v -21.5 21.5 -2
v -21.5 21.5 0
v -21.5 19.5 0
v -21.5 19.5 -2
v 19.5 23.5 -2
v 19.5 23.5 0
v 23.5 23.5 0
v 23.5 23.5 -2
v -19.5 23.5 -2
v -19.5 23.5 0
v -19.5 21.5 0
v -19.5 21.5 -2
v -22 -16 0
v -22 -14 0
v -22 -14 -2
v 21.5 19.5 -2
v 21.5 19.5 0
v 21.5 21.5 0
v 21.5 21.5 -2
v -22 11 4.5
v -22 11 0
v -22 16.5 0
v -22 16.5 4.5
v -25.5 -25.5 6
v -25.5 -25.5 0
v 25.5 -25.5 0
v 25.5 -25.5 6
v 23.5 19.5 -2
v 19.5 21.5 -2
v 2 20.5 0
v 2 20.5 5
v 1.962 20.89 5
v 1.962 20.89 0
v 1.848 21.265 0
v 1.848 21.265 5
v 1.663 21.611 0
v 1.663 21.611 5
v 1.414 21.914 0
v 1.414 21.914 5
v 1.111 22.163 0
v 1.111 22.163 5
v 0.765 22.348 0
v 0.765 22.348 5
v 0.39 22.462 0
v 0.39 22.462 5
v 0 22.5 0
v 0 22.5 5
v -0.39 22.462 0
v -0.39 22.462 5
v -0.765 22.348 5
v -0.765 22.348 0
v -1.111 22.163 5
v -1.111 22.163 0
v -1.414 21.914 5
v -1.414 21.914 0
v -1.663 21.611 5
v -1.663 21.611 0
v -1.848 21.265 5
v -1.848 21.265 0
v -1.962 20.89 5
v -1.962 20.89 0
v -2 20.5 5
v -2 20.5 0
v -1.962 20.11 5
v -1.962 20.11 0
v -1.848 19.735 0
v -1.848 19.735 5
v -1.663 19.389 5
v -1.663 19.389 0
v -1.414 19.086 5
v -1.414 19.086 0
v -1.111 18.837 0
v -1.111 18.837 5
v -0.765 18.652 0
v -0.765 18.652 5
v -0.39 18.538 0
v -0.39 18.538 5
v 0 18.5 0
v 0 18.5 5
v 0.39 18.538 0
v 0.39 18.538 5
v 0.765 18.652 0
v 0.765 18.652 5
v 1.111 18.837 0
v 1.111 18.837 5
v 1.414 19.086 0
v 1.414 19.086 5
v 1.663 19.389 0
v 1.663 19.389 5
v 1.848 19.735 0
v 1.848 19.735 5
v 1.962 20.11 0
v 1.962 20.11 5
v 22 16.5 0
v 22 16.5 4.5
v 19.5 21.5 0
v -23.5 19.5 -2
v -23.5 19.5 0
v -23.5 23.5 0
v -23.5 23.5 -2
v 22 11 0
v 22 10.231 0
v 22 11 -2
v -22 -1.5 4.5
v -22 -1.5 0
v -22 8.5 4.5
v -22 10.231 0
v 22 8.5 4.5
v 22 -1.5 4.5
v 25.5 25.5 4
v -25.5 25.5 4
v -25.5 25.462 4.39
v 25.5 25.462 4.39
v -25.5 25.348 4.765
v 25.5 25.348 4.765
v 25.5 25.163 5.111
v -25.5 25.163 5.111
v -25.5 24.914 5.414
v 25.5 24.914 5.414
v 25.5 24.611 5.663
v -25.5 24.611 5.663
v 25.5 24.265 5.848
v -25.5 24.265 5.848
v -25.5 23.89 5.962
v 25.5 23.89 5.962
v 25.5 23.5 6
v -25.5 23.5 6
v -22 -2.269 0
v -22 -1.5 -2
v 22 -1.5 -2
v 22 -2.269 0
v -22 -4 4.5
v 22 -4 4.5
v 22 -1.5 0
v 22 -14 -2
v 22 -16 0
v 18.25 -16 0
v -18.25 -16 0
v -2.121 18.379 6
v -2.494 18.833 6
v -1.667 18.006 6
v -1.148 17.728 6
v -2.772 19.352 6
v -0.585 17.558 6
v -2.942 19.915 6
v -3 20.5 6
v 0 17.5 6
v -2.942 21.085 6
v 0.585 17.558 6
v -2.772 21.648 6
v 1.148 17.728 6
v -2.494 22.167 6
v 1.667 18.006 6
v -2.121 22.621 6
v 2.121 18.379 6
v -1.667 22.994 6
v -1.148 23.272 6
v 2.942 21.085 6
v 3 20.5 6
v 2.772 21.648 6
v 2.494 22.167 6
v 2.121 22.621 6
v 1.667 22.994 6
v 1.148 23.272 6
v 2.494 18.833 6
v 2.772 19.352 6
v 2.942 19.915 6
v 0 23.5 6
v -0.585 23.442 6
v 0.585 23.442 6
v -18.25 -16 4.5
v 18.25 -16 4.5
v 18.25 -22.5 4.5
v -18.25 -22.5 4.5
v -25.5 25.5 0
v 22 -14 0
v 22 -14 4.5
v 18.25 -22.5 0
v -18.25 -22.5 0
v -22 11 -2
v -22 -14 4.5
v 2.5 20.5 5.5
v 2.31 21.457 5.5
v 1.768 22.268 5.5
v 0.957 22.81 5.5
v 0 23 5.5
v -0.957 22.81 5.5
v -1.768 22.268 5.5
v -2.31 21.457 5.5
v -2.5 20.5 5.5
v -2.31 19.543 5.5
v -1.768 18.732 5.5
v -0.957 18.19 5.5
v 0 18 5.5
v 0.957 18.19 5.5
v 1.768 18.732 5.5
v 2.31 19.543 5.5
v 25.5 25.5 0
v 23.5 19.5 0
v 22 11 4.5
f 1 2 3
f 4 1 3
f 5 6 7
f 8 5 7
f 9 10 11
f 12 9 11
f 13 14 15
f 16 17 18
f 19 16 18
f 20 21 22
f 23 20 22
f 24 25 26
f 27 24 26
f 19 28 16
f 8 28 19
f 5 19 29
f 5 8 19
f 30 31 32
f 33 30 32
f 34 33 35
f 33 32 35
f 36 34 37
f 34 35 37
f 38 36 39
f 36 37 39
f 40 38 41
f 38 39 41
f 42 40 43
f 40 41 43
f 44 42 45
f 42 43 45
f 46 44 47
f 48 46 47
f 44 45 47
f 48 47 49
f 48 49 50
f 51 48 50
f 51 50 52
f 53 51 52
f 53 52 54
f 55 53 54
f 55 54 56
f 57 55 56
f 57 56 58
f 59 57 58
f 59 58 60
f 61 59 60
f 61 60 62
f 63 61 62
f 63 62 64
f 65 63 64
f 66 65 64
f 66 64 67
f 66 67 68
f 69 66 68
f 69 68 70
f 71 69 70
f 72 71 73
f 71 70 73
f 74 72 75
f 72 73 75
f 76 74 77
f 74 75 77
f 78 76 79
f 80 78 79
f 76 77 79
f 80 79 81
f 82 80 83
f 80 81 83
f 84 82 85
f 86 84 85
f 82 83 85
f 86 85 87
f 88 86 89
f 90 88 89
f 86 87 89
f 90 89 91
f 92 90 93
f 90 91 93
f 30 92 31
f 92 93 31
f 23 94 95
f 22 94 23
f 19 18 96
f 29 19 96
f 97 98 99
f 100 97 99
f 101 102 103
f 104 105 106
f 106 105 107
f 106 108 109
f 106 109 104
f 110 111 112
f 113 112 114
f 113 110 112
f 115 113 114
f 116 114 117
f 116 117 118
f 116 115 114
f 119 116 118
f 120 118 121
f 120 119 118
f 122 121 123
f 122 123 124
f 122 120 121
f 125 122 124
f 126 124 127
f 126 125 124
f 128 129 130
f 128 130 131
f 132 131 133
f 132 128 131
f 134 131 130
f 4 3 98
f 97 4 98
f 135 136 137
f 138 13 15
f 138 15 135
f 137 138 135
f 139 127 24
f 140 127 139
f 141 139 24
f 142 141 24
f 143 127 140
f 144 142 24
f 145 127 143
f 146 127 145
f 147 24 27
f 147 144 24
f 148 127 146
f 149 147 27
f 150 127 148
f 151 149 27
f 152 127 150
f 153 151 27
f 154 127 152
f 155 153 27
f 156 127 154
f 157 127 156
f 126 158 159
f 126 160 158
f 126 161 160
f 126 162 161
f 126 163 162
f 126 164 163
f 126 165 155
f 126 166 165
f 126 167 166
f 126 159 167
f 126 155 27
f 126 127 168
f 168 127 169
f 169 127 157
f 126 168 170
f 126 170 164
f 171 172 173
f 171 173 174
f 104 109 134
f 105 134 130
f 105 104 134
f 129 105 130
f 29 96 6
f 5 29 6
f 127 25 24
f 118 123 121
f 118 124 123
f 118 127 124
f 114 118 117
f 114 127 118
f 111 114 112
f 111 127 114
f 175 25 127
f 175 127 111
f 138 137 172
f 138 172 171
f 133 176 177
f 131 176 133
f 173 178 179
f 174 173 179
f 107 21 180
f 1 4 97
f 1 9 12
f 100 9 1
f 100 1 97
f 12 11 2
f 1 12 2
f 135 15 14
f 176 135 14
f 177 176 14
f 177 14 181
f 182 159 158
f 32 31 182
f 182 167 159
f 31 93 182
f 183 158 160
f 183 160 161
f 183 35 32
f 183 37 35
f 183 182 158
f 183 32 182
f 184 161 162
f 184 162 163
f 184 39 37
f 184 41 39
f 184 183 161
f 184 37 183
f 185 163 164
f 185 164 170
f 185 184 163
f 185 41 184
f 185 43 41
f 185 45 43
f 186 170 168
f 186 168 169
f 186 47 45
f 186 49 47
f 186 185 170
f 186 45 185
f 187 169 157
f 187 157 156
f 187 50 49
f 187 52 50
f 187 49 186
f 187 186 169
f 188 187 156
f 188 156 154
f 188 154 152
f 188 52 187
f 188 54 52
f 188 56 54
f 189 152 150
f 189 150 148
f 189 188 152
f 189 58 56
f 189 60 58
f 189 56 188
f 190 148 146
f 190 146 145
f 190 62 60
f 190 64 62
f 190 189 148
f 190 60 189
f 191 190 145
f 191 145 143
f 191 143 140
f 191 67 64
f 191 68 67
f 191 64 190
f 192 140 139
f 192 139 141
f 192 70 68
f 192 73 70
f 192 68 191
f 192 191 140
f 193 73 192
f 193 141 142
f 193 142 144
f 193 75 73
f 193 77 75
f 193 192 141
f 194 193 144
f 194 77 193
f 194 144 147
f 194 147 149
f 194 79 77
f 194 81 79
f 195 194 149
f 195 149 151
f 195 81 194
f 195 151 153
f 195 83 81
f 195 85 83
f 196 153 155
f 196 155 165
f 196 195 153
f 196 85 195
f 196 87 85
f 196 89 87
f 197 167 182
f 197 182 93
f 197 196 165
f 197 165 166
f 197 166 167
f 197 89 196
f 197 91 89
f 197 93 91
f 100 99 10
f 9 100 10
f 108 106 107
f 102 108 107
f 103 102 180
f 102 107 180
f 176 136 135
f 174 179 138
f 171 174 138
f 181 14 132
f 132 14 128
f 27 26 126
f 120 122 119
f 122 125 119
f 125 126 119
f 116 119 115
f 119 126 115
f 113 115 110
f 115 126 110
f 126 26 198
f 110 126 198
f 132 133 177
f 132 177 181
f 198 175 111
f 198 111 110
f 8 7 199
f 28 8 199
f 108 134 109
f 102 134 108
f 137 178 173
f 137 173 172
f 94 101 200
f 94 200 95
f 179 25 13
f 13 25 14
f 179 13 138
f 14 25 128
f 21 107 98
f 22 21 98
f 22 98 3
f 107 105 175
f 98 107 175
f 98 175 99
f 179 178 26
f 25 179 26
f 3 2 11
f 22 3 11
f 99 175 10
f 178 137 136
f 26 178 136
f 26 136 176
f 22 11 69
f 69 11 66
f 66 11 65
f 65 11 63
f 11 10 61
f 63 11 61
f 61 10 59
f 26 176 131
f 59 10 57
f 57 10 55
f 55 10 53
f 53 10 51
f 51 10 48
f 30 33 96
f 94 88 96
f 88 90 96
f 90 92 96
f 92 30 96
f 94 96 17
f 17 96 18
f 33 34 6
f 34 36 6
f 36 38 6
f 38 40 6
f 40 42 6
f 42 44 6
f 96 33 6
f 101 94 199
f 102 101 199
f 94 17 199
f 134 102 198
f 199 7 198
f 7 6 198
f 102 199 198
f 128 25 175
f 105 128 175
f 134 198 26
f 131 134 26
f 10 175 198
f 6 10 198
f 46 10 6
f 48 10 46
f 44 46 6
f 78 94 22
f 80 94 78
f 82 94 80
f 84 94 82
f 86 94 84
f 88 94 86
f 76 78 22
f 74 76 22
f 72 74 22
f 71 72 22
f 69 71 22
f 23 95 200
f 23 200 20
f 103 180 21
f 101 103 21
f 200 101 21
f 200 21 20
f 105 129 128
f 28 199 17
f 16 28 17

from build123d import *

# Parameters (mm, degrees)
ESBO_O1_W                = 51
ESBO_O1_H                = 51
RESSALTO_EXTRUS_O1_DEPTH = 6
ESBO_O2_W                = 36.5
ESBO_O2_H                = 6.5
CORTE_EXTRUS_O1_DEPTH    = 4.5
ESBO_O3_R                = 2
CORTE_EXTRUS_O2_DEPTH    = 37.558172821
ESBO_O4_W                = 44
ESBO_O4_H                = 30.5
CORTE_EXTRUS_O3_DEPTH    = 4.5
FILETE1_R                = 2
CHANFRO1_SIZE            = 1
RESSALTO_EXTRUS_O2_DEPTH = 2
RESSALTO_EXTRUS_O3_REACH = 56.245


with BuildPart() as part:
    # Esboço1 → Ressalto-extrusão1 (new body)
    with BuildSketch(Plane.XY):
        Rectangle(ESBO_O1_W, ESBO_O1_H)
    extrude(amount=RESSALTO_EXTRUS_O1_DEPTH)

    # Esboço2 → Corte-extrusão1 (cut)
    with BuildSketch(Plane(origin=(0, 0, 0), x_dir=(-1, 0, 0), z_dir=(0, 0, -1))):
        with Locations((0, -19.25)):
            Rectangle(ESBO_O2_W, ESBO_O2_H)
    extrude(amount=-CORTE_EXTRUS_O1_DEPTH, mode=Mode.SUBTRACT)

    # Esboço3 → Corte-extrusão2 (cut, through all)
    with BuildSketch(Plane.XY.offset(6)):
        with Locations((0, 20.5)):
            Circle(ESBO_O3_R)
    extrude(amount=-CORTE_EXTRUS_O2_DEPTH, mode=Mode.SUBTRACT)

    # Esboço4 → Corte-extrusão3 (cut)
    with BuildSketch(Plane(origin=(0, 0, 0), x_dir=(-1, 0, 0), z_dir=(0, 0, -1))):
        with Locations((0, 1.25)):
            Rectangle(ESBO_O4_W, ESBO_O4_H)
    extrude(amount=-CORTE_EXTRUS_O3_DEPTH, mode=Mode.SUBTRACT)

    # Filete1
    filete1_edges = [part.edges().sort_by_distance(p)[0] for p in [
        (0, 25.5, 6),
    ]]
    fillet(filete1_edges, radius=FILETE1_R)

    # Chanfro1
    chanfro1_edges = [part.edges().sort_by_distance(p)[0] for p in [
        (-2, 20.5, 6),
    ]]
    chamfer(chanfro1_edges, length=CHANFRO1_SIZE - 0.0001)  # a hair under: the kernel refuses the full size

    # Esboço5 → Ressalto-extrusão2 (add)
    with BuildSketch(Plane(origin=(0, 0, 0), x_dir=(-1, 0, 0), z_dir=(0, 0, -1))):
        Polygon((-23.5, 19.5), (-21.5, 19.5), (-21.5, 21.5), (-19.5, 21.5), (-19.5, 23.5), (-23.5, 23.5), align=None)
        Polygon((21.5, 19.5), (23.5, 19.5), (23.5, 23.5), (19.5, 23.5), (19.5, 21.5), (21.5, 21.5), align=None)
    extrude(amount=RESSALTO_EXTRUS_O2_DEPTH)

    # Ressalto-extrusão3: up to this face of the body (flat: up to its plane)
    ressalto_extrus_o3_end = Plane(part.part.faces().sort_by_distance((22, 1.25, 2.25))[0])
    # Esboço6 → Ressalto-extrusão3 (add, up to the picked face)
    with BuildSketch(Plane(origin=(-22, 0, 0), x_dir=(0, 0, -1), z_dir=(1, 0, 0)), mode=Mode.PRIVATE) as ressalto_extrus_o3_sk1:
        Polygon((0, -16), (2, -14), (0, -14), align=None)
    ressalto_extrus_o3_tool1 = split(extrude(ressalto_extrus_o3_sk1.sketch, amount=RESSALTO_EXTRUS_O3_REACH, mode=Mode.PRIVATE), bisect_by=ressalto_extrus_o3_end, keep=Keep.BOTH, mode=Mode.PRIVATE)
    # Esboço6 → Ressalto-extrusão3 (add, up to the picked face)
    with BuildSketch(Plane(origin=(-22, 0, 0), x_dir=(0, 0, -1), z_dir=(1, 0, 0)), mode=Mode.PRIVATE) as ressalto_extrus_o3_sk2:
        Polygon((-4.5, -1.5), (2, -1.5), (-4.5, -4), align=None)
    ressalto_extrus_o3_tool2 = split(extrude(ressalto_extrus_o3_sk2.sketch, amount=RESSALTO_EXTRUS_O3_REACH, mode=Mode.PRIVATE), bisect_by=ressalto_extrus_o3_end, keep=Keep.BOTH, mode=Mode.PRIVATE)
    # Esboço6 → Ressalto-extrusão3 (add, up to the picked face)
    with BuildSketch(Plane(origin=(-22, 0, 0), x_dir=(0, 0, -1), z_dir=(1, 0, 0)), mode=Mode.PRIVATE) as ressalto_extrus_o3_sk3:
        Polygon((-4.5, 8.5), (2, 11), (-4.5, 11), align=None)
    ressalto_extrus_o3_tool3 = split(extrude(ressalto_extrus_o3_sk3.sketch, amount=RESSALTO_EXTRUS_O3_REACH, mode=Mode.PRIVATE), bisect_by=ressalto_extrus_o3_end, keep=Keep.BOTH, mode=Mode.PRIVATE)
    add(ressalto_extrus_o3_tool1.solids().sort_by(Axis((-22, -14.666667, -0.666667), (1, 0, 0)))[0])
    add(ressalto_extrus_o3_tool2.solids().sort_by(Axis((-22, -2.333333, 2.333333), (1, 0, 0)))[0])
    add(ressalto_extrus_o3_tool3.solids().sort_by(Axis((-22, 10.166667, 2.333333), (1, 0, 0)))[0])


solid = part.part
